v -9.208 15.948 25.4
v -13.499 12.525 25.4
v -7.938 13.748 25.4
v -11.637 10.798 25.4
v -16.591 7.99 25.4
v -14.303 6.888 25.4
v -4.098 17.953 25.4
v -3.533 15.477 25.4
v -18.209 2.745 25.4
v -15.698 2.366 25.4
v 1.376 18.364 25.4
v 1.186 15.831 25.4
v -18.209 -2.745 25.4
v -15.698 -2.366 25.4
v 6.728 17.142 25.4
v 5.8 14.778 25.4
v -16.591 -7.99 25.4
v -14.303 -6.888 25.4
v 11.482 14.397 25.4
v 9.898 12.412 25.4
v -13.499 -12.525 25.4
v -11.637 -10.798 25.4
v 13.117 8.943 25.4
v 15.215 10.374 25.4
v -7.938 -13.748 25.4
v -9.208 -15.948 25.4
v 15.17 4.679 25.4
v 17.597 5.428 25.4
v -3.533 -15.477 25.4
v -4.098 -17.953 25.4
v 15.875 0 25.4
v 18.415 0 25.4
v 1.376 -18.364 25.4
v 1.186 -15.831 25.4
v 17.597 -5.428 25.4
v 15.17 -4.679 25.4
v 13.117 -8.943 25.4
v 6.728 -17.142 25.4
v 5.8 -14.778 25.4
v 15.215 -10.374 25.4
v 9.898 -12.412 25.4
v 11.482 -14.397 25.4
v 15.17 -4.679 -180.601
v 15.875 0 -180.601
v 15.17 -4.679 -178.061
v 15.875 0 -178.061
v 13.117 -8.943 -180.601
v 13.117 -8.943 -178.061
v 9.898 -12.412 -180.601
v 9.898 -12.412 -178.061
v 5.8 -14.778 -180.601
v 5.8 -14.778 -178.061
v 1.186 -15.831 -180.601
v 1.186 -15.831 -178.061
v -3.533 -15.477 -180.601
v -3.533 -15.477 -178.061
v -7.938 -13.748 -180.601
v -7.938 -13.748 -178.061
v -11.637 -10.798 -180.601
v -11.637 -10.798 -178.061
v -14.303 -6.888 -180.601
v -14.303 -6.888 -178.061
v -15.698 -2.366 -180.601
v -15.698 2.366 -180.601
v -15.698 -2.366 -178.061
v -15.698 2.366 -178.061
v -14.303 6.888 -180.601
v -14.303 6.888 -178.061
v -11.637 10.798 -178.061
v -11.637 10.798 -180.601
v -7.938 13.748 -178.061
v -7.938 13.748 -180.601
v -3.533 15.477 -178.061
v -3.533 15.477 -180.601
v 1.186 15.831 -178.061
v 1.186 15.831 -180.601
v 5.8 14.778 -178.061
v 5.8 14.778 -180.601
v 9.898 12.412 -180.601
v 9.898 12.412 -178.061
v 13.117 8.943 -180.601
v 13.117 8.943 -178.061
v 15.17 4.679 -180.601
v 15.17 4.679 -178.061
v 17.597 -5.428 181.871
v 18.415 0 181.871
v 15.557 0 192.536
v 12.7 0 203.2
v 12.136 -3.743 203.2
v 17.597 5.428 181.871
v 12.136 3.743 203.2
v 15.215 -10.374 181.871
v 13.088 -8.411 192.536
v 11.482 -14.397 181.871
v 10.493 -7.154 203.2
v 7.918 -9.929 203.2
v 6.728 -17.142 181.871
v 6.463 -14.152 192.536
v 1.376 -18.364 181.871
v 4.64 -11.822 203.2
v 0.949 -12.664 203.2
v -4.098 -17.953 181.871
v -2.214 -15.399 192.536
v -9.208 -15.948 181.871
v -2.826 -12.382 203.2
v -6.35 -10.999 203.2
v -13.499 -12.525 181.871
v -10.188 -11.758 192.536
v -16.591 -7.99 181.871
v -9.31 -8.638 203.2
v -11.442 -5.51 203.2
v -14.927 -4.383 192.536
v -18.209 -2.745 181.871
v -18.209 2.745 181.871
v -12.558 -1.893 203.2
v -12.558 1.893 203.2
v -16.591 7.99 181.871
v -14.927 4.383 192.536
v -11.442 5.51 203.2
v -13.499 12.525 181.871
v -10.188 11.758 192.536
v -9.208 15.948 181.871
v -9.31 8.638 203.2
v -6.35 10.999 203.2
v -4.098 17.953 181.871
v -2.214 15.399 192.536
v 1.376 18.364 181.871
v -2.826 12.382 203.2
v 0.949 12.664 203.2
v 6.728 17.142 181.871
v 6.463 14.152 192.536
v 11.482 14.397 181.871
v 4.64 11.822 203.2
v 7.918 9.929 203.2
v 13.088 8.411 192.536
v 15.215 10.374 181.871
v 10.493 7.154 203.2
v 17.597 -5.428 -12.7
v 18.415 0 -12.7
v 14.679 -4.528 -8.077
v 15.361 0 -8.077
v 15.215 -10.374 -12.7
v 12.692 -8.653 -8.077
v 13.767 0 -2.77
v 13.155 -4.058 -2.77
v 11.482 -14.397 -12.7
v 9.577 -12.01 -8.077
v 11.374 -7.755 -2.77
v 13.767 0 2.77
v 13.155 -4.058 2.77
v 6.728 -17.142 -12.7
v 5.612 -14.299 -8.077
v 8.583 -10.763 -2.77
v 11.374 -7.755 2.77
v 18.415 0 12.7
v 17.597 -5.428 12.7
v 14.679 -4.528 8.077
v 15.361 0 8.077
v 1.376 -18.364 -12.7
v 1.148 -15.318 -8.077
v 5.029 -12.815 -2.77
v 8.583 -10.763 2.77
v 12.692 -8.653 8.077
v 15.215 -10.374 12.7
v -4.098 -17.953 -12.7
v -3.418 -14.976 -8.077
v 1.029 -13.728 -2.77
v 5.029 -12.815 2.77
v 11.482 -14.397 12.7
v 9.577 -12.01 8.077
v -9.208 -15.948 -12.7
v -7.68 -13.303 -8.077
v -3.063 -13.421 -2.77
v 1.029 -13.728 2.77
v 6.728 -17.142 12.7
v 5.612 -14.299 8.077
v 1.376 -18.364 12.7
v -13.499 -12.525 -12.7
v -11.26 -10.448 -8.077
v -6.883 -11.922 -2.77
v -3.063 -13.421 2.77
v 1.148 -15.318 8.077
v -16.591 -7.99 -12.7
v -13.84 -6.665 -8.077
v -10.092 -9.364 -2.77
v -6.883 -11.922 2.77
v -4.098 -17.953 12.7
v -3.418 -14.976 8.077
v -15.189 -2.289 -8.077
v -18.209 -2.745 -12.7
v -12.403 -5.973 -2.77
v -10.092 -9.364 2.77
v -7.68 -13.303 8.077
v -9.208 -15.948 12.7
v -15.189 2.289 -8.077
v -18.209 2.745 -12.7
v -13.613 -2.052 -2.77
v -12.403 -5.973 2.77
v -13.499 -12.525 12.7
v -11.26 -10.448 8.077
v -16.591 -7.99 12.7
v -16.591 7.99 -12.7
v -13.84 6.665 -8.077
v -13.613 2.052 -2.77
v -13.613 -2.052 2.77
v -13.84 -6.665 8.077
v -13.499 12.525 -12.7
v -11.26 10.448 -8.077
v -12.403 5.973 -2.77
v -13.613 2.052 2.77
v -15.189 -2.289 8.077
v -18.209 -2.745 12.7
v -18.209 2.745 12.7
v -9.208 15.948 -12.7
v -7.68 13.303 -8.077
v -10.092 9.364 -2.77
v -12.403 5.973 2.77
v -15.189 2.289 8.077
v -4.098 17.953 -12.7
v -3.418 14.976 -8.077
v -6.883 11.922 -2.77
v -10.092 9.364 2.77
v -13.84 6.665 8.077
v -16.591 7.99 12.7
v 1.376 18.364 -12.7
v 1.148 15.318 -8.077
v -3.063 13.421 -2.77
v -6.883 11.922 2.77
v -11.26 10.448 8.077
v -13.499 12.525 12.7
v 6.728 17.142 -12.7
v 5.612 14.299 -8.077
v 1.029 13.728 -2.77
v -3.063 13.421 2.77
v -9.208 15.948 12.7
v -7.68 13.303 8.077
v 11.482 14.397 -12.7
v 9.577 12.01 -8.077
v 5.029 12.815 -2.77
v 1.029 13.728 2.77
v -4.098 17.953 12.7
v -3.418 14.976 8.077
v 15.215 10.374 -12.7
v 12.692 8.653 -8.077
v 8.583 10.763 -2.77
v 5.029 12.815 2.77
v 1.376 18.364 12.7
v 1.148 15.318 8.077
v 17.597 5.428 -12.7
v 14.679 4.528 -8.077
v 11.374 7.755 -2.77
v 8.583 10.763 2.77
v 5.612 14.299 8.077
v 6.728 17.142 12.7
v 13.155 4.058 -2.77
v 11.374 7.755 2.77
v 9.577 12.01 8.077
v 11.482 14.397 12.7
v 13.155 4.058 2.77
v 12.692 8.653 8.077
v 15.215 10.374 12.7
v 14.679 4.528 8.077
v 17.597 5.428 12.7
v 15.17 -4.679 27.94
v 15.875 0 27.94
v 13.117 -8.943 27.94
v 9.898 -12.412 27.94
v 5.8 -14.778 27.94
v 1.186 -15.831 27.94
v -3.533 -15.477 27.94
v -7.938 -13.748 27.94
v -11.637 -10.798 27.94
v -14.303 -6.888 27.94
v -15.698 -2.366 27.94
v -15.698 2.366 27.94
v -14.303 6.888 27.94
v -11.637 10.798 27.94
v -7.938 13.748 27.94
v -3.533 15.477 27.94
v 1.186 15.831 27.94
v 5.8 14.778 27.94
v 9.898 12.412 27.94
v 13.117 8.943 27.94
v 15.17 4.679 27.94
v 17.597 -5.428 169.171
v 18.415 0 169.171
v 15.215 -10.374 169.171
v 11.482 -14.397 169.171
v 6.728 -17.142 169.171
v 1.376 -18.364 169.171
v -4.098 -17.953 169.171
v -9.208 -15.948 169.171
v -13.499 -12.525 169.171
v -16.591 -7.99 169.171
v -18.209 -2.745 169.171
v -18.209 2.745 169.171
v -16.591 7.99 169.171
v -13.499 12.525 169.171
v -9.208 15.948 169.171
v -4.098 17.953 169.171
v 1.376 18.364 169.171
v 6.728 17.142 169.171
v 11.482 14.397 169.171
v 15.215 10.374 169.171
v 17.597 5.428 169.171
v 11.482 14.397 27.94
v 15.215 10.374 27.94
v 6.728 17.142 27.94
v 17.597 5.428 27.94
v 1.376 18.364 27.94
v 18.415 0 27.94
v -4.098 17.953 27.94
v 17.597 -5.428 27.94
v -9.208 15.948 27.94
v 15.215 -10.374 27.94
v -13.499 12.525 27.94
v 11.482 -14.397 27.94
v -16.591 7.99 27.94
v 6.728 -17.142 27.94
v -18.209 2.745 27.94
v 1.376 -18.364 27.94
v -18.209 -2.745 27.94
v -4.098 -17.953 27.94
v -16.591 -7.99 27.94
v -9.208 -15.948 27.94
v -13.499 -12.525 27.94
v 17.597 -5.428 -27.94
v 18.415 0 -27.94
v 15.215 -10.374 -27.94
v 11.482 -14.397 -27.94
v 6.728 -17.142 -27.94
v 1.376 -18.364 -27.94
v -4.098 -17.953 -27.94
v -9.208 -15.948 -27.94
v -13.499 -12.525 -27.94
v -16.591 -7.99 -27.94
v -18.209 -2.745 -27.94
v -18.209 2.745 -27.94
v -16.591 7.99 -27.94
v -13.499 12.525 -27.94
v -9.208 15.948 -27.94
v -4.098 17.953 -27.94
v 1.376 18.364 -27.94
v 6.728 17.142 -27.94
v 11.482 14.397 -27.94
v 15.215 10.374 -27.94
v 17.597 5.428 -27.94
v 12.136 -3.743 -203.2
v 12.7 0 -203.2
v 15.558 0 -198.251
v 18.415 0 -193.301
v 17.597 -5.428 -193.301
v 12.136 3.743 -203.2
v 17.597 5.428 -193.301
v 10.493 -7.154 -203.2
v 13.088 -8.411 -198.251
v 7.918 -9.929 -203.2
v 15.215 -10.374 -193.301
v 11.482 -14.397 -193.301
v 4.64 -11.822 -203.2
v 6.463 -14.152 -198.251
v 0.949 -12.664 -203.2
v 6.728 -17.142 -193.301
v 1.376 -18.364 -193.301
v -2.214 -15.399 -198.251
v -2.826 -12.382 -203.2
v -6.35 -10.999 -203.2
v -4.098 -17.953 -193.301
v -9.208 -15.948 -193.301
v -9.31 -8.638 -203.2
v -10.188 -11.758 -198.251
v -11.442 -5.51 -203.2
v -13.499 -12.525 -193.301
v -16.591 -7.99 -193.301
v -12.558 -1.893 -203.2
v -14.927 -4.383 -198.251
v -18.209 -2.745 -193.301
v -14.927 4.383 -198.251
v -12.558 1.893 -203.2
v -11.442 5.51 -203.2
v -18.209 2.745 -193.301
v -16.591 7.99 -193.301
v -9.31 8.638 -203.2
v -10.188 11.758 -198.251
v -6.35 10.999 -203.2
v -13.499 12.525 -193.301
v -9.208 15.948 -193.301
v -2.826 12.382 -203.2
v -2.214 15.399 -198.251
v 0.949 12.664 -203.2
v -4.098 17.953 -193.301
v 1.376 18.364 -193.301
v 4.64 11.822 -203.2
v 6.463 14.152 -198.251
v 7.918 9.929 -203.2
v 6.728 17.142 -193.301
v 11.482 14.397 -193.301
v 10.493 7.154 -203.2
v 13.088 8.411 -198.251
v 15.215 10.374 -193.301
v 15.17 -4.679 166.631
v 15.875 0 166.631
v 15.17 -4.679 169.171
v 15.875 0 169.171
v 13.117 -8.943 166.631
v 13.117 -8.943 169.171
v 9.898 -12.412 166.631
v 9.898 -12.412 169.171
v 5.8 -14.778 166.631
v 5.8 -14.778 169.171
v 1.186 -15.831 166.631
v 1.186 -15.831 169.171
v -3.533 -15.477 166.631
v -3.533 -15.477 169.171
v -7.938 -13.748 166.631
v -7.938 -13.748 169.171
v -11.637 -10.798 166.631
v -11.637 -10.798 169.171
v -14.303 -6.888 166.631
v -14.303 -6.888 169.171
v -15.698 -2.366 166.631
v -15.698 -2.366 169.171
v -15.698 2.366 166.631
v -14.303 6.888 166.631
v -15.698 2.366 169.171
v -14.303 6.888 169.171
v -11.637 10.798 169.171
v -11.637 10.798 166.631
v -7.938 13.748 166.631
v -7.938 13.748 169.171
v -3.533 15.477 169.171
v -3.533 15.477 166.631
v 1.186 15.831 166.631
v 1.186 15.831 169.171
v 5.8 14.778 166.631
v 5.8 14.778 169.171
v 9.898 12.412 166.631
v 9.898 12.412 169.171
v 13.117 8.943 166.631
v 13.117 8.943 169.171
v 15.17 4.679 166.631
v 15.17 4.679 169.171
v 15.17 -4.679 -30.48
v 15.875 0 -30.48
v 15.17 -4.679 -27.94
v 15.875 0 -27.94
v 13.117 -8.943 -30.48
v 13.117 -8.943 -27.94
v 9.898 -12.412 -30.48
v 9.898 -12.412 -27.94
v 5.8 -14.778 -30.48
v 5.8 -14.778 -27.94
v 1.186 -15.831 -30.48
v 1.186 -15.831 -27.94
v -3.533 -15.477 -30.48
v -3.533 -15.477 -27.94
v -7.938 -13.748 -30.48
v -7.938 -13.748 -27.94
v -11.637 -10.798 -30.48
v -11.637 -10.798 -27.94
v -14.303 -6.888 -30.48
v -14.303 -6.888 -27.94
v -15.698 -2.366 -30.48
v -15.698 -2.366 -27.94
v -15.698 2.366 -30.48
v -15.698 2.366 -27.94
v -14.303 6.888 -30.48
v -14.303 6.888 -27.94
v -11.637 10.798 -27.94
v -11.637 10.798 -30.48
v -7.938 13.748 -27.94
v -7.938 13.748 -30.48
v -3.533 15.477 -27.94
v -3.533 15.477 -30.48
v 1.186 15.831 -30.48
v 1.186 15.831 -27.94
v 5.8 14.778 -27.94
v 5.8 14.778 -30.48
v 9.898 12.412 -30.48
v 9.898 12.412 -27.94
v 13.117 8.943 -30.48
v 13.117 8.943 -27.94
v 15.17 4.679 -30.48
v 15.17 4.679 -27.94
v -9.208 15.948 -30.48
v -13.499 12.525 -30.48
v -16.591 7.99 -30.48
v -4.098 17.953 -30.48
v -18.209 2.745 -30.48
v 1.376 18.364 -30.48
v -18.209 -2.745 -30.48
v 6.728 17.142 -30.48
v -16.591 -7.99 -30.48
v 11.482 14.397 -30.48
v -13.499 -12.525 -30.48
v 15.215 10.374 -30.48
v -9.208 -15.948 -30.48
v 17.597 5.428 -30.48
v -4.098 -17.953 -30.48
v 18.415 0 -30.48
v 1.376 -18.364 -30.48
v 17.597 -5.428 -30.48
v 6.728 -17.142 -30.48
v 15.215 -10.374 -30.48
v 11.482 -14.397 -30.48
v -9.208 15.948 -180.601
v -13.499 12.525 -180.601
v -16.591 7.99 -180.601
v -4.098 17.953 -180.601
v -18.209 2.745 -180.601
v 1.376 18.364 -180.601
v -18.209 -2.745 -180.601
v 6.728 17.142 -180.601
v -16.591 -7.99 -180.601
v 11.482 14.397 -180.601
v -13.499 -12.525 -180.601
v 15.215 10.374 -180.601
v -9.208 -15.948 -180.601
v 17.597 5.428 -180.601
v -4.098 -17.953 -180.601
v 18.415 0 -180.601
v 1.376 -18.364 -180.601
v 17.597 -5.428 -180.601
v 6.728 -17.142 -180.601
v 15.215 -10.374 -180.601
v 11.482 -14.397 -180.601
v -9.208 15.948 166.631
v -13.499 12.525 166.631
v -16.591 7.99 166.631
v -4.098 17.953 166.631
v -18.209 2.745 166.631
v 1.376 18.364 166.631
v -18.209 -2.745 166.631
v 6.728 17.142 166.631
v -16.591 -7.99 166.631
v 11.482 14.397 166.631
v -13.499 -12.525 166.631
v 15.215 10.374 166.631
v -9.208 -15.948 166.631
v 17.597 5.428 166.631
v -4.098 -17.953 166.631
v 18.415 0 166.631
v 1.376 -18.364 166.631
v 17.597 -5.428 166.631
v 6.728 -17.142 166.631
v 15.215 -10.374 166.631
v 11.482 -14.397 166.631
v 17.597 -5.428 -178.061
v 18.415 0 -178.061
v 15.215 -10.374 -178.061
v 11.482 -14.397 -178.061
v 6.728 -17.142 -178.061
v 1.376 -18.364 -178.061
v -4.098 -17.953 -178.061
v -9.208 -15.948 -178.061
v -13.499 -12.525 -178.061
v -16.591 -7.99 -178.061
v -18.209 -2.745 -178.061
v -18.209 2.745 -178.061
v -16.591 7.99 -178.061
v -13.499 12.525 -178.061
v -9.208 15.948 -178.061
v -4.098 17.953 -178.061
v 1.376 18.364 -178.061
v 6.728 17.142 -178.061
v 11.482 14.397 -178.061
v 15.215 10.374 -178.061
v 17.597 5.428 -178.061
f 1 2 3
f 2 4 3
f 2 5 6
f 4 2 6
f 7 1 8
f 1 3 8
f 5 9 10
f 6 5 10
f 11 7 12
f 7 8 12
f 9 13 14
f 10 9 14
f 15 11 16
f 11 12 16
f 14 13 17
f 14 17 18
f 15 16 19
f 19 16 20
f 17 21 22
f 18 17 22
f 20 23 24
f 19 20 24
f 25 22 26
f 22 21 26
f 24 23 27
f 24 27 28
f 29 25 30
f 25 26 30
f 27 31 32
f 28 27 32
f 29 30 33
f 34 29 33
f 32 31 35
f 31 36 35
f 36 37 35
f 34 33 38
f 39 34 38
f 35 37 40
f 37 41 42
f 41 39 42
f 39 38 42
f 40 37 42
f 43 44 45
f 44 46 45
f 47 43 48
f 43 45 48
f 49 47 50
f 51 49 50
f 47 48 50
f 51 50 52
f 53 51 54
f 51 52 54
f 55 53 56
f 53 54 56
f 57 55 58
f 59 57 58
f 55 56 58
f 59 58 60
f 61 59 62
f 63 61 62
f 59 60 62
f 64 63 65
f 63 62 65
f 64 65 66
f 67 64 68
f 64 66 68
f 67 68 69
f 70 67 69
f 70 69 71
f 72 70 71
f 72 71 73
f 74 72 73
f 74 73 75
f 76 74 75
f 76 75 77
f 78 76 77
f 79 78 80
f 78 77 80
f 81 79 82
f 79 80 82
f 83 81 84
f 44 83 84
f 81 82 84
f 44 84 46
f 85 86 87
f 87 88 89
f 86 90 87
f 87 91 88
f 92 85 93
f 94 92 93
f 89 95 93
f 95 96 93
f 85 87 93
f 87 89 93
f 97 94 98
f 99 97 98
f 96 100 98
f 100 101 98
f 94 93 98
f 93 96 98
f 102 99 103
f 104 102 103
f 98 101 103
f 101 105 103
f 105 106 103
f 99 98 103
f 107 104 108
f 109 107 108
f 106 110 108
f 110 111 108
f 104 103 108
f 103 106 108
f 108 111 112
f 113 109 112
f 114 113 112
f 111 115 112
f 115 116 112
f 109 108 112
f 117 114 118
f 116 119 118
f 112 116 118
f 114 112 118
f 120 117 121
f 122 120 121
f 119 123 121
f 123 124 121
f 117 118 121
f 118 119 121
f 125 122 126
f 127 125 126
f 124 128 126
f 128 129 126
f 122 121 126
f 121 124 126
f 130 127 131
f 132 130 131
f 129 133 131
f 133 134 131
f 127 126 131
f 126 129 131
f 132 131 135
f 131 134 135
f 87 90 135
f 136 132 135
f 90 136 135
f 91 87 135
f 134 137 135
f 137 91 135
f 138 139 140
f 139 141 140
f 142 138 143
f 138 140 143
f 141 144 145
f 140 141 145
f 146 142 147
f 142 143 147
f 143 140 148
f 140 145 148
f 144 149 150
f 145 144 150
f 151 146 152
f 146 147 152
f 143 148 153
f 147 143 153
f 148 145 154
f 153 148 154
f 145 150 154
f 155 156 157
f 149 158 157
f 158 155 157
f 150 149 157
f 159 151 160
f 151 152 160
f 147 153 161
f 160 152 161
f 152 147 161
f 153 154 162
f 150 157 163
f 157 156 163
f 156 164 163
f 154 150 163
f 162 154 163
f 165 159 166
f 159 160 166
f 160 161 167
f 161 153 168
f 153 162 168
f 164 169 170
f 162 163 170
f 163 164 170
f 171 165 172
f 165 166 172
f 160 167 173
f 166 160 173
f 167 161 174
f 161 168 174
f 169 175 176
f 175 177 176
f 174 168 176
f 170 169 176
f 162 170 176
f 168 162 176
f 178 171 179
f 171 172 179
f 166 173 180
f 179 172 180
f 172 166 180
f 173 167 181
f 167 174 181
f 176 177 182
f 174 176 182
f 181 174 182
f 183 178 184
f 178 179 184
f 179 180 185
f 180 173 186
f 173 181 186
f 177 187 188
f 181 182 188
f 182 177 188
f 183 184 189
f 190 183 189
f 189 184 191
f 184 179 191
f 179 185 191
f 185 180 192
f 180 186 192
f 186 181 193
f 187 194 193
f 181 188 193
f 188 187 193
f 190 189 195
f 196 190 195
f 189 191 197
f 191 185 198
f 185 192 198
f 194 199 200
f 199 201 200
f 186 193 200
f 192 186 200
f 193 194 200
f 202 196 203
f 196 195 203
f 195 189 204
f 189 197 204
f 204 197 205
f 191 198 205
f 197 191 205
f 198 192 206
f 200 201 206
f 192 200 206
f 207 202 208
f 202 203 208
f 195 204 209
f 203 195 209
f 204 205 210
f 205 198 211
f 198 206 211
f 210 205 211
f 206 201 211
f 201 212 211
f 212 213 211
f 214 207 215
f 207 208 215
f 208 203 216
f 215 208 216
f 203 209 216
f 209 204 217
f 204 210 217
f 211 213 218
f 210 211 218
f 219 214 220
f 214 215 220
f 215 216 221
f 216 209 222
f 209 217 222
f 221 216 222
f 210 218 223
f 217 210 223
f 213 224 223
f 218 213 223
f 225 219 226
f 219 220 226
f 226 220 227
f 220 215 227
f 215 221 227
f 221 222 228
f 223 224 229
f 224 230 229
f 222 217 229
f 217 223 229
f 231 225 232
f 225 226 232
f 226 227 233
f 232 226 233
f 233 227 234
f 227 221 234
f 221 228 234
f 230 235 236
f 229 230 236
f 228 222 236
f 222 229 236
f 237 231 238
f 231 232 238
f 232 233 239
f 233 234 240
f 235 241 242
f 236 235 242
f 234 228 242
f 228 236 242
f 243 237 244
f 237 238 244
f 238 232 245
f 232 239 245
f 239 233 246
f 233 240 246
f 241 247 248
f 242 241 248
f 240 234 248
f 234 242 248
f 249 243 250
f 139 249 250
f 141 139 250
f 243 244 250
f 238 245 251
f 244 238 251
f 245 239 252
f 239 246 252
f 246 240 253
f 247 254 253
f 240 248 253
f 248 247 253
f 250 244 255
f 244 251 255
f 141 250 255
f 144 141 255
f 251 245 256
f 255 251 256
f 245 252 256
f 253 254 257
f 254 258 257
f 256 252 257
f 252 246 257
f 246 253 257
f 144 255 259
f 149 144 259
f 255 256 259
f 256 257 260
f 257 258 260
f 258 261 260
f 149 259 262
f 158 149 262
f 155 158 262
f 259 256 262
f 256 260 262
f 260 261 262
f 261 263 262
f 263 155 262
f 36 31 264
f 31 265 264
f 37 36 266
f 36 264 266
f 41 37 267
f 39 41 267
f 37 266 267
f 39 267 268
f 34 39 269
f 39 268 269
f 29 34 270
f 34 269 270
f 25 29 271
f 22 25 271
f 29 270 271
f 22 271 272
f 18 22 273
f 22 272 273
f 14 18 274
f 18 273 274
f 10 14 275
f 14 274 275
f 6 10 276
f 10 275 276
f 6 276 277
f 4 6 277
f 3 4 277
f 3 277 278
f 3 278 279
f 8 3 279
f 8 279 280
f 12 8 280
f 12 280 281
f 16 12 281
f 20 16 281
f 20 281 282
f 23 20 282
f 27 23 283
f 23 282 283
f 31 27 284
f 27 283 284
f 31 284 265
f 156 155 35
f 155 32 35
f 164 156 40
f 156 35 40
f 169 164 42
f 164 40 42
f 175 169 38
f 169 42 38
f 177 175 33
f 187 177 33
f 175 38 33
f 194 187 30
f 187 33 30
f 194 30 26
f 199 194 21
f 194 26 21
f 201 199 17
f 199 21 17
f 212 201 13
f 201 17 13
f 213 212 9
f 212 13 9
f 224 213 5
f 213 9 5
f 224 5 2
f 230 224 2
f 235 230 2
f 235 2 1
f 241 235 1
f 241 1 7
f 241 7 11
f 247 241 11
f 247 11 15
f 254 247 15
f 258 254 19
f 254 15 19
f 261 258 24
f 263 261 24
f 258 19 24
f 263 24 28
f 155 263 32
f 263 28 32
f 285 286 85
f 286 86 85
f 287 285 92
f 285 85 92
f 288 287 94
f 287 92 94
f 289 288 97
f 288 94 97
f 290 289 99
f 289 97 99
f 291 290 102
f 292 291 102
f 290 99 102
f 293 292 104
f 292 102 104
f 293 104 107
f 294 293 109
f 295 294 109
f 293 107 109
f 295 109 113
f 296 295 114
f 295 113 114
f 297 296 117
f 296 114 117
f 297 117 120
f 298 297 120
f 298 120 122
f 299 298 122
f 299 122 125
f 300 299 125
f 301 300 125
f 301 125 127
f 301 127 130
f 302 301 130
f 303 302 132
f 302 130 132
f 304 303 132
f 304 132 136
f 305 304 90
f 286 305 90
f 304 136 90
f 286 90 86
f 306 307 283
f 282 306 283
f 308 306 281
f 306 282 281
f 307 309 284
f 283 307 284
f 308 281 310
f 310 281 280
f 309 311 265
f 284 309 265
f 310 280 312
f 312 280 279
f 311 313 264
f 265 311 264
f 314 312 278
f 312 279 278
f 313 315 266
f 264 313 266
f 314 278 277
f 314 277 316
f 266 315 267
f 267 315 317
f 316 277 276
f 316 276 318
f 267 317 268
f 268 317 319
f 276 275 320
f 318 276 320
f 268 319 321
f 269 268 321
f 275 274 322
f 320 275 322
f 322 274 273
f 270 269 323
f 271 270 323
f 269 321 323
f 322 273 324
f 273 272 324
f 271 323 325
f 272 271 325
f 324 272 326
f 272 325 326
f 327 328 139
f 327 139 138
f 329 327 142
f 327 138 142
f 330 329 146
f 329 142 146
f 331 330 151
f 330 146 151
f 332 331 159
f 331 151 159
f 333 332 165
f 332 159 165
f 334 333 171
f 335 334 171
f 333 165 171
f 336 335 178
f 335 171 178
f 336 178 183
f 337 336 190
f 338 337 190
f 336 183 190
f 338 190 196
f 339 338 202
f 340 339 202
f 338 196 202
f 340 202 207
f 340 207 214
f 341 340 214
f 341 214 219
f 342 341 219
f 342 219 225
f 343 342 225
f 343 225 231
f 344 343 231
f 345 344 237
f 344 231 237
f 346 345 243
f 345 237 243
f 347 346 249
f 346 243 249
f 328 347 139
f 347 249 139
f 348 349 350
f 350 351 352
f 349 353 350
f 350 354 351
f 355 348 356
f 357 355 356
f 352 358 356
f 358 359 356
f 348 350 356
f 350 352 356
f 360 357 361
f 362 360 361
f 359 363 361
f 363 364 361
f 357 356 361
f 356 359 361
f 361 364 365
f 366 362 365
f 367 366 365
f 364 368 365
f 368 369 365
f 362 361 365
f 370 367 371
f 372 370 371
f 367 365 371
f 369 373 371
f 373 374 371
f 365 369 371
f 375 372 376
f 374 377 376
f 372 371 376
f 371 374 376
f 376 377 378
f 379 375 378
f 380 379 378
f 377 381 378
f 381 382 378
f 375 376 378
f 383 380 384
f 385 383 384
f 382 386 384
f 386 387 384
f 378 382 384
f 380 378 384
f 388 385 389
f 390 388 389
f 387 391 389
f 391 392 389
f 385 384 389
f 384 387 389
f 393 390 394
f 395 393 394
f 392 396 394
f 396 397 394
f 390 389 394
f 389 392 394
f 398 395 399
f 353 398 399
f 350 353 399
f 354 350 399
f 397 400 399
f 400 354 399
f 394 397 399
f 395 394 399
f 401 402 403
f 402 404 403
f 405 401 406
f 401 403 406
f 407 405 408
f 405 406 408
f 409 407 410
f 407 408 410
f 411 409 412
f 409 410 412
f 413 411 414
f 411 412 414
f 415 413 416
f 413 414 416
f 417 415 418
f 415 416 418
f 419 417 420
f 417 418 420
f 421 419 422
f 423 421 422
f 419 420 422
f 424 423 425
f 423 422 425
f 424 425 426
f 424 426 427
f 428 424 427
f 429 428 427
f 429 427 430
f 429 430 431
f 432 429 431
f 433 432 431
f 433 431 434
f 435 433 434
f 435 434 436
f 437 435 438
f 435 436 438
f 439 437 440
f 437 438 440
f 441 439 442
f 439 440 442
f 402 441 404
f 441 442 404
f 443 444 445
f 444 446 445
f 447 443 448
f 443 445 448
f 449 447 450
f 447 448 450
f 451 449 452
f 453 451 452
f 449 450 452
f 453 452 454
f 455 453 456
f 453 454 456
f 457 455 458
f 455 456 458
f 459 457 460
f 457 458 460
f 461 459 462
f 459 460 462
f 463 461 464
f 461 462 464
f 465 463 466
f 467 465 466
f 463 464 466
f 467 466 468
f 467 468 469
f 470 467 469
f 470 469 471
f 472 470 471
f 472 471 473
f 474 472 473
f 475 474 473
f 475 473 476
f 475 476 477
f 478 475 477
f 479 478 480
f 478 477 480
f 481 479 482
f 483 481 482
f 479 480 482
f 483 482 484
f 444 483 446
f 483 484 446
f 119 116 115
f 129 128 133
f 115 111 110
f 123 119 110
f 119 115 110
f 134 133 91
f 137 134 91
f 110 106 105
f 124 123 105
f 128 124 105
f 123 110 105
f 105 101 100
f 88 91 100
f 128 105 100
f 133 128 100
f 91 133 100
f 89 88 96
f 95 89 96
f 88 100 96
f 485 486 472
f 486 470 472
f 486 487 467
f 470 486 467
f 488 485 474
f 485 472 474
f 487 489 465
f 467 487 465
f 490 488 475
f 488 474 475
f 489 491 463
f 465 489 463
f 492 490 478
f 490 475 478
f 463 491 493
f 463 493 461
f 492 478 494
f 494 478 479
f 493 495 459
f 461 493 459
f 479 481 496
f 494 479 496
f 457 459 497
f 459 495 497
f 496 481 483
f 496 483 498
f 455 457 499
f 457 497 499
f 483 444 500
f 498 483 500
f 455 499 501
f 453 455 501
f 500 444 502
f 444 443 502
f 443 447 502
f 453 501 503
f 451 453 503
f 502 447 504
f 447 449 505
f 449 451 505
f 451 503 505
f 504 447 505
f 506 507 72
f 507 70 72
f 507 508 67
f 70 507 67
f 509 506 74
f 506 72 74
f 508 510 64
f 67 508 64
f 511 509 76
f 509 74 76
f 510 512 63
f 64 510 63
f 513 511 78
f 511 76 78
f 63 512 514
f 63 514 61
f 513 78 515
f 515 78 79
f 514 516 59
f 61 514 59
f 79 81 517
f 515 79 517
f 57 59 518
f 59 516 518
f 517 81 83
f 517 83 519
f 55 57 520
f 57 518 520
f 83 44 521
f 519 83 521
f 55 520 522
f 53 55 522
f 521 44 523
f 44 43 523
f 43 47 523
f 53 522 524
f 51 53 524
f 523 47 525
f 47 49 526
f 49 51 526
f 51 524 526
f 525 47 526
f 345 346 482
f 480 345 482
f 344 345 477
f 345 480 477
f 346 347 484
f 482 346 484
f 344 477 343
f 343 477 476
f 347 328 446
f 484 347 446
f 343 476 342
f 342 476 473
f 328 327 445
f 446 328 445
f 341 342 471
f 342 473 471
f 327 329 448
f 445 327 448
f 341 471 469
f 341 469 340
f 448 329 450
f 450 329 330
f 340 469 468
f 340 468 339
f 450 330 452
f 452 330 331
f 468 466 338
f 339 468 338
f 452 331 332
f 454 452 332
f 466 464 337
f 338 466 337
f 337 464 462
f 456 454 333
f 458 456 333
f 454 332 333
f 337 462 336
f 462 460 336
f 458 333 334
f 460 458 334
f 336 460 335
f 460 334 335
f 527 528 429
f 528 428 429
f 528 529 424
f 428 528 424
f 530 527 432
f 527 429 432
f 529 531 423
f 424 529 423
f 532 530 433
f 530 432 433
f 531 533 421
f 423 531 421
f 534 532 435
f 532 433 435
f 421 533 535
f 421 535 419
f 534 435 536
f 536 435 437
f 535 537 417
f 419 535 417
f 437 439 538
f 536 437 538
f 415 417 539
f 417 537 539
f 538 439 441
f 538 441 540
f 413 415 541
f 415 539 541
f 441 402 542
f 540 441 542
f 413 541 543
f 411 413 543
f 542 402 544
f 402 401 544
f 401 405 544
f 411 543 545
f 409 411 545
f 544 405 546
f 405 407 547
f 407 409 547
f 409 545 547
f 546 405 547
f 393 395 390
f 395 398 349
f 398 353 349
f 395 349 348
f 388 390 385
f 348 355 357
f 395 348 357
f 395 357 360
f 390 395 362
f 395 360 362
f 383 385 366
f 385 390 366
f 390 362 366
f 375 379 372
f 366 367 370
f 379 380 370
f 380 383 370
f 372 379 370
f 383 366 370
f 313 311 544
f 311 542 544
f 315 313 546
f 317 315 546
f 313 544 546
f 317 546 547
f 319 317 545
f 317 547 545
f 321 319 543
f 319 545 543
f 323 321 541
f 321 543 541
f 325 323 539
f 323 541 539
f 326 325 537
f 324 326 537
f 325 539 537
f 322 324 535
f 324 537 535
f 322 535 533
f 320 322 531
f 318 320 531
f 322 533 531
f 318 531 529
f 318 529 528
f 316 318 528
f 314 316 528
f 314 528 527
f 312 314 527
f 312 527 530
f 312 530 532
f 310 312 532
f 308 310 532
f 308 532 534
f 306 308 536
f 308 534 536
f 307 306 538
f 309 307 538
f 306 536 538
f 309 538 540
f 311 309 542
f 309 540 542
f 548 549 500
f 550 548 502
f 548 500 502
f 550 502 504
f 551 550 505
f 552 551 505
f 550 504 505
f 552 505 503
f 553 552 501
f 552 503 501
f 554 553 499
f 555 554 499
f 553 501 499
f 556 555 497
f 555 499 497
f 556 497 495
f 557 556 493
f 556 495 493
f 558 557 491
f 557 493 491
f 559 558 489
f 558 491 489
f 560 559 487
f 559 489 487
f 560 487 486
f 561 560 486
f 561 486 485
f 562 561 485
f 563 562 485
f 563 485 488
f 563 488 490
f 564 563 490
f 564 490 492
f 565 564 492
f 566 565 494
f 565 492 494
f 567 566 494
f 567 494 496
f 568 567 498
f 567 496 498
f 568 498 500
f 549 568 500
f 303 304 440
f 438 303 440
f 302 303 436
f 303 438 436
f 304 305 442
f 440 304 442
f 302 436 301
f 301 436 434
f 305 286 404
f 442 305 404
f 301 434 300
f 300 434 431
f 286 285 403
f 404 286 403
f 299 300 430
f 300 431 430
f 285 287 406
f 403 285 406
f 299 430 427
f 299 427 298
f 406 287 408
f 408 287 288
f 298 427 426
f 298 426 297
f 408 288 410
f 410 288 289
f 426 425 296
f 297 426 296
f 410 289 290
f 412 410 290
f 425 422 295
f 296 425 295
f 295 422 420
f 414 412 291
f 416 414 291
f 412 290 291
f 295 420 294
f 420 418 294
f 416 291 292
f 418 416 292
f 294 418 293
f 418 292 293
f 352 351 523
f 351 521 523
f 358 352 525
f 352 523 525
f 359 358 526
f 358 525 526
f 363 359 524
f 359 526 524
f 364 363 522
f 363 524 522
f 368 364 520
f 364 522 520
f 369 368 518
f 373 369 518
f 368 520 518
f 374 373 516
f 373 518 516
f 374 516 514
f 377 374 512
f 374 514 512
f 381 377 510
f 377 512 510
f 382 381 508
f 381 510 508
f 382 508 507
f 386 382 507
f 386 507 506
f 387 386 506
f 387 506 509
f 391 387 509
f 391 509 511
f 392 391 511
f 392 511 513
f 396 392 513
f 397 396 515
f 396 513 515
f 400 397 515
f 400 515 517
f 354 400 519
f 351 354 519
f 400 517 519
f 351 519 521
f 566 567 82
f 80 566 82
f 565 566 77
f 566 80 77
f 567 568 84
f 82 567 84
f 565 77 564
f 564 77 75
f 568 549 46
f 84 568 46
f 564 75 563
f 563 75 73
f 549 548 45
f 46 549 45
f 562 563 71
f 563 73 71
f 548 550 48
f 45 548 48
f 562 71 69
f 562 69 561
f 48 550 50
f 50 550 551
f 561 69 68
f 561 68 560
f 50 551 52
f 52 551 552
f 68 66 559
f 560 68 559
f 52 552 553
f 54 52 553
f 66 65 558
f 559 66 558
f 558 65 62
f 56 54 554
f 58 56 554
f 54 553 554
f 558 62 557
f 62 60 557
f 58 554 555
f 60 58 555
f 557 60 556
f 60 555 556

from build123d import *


with BuildPart() as f1:
    # F0 (on Front) → F1 (revolve)
    with BuildSketch(Plane.XZ):
        with BuildLine():
            Line((12.7, 203.2), (0, 203.2))
            Line((0, 203.2), (0, -203.2))
            Line((0, -203.2), (12.7, -203.2))
            Line((12.7, -203.2), (18.415, -193.30133))
            Line((18.415, -193.30133), (18.415, -180.60133))
            Line((18.415, -180.60133), (15.875, -180.60133))
            Line((15.875, -180.60133), (15.875, -178.06133))
            Line((15.875, -178.06133), (18.415, -178.06133))
            Line((18.415, -178.06133), (18.415, -30.48))
            Line((18.415, -30.48), (15.875, -30.48))
            Line((15.875, -30.48), (15.875, -27.94))
            Line((15.875, -27.94), (18.415, -27.94))
            Line((18.415, -27.94), (18.415, -12.7))
            ThreePointArc((18.415, -12.7), (13.564032, 0), (18.415, 12.7))
            Line((18.415, 12.7), (18.415, 25.4))
            Line((18.415, 25.4), (15.875, 25.4))
            Line((15.875, 25.4), (15.875, 27.94))
            Line((15.875, 27.94), (18.415, 27.94))
            Line((18.415, 27.94), (18.415, 166.63133))
            Line((18.415, 166.63133), (15.875, 166.63133))
            Line((15.875, 166.63133), (15.875, 169.17133))
            Line((15.875, 169.17133), (18.415, 169.17133))
            Line((18.415, 169.17133), (18.415, 181.87133))
            Line((18.415, 181.87133), (12.7, 203.2))
        make_face()
    revolve(axis=Axis((0, 0, 0), (0, 0, -1)))


solid = f1.part
